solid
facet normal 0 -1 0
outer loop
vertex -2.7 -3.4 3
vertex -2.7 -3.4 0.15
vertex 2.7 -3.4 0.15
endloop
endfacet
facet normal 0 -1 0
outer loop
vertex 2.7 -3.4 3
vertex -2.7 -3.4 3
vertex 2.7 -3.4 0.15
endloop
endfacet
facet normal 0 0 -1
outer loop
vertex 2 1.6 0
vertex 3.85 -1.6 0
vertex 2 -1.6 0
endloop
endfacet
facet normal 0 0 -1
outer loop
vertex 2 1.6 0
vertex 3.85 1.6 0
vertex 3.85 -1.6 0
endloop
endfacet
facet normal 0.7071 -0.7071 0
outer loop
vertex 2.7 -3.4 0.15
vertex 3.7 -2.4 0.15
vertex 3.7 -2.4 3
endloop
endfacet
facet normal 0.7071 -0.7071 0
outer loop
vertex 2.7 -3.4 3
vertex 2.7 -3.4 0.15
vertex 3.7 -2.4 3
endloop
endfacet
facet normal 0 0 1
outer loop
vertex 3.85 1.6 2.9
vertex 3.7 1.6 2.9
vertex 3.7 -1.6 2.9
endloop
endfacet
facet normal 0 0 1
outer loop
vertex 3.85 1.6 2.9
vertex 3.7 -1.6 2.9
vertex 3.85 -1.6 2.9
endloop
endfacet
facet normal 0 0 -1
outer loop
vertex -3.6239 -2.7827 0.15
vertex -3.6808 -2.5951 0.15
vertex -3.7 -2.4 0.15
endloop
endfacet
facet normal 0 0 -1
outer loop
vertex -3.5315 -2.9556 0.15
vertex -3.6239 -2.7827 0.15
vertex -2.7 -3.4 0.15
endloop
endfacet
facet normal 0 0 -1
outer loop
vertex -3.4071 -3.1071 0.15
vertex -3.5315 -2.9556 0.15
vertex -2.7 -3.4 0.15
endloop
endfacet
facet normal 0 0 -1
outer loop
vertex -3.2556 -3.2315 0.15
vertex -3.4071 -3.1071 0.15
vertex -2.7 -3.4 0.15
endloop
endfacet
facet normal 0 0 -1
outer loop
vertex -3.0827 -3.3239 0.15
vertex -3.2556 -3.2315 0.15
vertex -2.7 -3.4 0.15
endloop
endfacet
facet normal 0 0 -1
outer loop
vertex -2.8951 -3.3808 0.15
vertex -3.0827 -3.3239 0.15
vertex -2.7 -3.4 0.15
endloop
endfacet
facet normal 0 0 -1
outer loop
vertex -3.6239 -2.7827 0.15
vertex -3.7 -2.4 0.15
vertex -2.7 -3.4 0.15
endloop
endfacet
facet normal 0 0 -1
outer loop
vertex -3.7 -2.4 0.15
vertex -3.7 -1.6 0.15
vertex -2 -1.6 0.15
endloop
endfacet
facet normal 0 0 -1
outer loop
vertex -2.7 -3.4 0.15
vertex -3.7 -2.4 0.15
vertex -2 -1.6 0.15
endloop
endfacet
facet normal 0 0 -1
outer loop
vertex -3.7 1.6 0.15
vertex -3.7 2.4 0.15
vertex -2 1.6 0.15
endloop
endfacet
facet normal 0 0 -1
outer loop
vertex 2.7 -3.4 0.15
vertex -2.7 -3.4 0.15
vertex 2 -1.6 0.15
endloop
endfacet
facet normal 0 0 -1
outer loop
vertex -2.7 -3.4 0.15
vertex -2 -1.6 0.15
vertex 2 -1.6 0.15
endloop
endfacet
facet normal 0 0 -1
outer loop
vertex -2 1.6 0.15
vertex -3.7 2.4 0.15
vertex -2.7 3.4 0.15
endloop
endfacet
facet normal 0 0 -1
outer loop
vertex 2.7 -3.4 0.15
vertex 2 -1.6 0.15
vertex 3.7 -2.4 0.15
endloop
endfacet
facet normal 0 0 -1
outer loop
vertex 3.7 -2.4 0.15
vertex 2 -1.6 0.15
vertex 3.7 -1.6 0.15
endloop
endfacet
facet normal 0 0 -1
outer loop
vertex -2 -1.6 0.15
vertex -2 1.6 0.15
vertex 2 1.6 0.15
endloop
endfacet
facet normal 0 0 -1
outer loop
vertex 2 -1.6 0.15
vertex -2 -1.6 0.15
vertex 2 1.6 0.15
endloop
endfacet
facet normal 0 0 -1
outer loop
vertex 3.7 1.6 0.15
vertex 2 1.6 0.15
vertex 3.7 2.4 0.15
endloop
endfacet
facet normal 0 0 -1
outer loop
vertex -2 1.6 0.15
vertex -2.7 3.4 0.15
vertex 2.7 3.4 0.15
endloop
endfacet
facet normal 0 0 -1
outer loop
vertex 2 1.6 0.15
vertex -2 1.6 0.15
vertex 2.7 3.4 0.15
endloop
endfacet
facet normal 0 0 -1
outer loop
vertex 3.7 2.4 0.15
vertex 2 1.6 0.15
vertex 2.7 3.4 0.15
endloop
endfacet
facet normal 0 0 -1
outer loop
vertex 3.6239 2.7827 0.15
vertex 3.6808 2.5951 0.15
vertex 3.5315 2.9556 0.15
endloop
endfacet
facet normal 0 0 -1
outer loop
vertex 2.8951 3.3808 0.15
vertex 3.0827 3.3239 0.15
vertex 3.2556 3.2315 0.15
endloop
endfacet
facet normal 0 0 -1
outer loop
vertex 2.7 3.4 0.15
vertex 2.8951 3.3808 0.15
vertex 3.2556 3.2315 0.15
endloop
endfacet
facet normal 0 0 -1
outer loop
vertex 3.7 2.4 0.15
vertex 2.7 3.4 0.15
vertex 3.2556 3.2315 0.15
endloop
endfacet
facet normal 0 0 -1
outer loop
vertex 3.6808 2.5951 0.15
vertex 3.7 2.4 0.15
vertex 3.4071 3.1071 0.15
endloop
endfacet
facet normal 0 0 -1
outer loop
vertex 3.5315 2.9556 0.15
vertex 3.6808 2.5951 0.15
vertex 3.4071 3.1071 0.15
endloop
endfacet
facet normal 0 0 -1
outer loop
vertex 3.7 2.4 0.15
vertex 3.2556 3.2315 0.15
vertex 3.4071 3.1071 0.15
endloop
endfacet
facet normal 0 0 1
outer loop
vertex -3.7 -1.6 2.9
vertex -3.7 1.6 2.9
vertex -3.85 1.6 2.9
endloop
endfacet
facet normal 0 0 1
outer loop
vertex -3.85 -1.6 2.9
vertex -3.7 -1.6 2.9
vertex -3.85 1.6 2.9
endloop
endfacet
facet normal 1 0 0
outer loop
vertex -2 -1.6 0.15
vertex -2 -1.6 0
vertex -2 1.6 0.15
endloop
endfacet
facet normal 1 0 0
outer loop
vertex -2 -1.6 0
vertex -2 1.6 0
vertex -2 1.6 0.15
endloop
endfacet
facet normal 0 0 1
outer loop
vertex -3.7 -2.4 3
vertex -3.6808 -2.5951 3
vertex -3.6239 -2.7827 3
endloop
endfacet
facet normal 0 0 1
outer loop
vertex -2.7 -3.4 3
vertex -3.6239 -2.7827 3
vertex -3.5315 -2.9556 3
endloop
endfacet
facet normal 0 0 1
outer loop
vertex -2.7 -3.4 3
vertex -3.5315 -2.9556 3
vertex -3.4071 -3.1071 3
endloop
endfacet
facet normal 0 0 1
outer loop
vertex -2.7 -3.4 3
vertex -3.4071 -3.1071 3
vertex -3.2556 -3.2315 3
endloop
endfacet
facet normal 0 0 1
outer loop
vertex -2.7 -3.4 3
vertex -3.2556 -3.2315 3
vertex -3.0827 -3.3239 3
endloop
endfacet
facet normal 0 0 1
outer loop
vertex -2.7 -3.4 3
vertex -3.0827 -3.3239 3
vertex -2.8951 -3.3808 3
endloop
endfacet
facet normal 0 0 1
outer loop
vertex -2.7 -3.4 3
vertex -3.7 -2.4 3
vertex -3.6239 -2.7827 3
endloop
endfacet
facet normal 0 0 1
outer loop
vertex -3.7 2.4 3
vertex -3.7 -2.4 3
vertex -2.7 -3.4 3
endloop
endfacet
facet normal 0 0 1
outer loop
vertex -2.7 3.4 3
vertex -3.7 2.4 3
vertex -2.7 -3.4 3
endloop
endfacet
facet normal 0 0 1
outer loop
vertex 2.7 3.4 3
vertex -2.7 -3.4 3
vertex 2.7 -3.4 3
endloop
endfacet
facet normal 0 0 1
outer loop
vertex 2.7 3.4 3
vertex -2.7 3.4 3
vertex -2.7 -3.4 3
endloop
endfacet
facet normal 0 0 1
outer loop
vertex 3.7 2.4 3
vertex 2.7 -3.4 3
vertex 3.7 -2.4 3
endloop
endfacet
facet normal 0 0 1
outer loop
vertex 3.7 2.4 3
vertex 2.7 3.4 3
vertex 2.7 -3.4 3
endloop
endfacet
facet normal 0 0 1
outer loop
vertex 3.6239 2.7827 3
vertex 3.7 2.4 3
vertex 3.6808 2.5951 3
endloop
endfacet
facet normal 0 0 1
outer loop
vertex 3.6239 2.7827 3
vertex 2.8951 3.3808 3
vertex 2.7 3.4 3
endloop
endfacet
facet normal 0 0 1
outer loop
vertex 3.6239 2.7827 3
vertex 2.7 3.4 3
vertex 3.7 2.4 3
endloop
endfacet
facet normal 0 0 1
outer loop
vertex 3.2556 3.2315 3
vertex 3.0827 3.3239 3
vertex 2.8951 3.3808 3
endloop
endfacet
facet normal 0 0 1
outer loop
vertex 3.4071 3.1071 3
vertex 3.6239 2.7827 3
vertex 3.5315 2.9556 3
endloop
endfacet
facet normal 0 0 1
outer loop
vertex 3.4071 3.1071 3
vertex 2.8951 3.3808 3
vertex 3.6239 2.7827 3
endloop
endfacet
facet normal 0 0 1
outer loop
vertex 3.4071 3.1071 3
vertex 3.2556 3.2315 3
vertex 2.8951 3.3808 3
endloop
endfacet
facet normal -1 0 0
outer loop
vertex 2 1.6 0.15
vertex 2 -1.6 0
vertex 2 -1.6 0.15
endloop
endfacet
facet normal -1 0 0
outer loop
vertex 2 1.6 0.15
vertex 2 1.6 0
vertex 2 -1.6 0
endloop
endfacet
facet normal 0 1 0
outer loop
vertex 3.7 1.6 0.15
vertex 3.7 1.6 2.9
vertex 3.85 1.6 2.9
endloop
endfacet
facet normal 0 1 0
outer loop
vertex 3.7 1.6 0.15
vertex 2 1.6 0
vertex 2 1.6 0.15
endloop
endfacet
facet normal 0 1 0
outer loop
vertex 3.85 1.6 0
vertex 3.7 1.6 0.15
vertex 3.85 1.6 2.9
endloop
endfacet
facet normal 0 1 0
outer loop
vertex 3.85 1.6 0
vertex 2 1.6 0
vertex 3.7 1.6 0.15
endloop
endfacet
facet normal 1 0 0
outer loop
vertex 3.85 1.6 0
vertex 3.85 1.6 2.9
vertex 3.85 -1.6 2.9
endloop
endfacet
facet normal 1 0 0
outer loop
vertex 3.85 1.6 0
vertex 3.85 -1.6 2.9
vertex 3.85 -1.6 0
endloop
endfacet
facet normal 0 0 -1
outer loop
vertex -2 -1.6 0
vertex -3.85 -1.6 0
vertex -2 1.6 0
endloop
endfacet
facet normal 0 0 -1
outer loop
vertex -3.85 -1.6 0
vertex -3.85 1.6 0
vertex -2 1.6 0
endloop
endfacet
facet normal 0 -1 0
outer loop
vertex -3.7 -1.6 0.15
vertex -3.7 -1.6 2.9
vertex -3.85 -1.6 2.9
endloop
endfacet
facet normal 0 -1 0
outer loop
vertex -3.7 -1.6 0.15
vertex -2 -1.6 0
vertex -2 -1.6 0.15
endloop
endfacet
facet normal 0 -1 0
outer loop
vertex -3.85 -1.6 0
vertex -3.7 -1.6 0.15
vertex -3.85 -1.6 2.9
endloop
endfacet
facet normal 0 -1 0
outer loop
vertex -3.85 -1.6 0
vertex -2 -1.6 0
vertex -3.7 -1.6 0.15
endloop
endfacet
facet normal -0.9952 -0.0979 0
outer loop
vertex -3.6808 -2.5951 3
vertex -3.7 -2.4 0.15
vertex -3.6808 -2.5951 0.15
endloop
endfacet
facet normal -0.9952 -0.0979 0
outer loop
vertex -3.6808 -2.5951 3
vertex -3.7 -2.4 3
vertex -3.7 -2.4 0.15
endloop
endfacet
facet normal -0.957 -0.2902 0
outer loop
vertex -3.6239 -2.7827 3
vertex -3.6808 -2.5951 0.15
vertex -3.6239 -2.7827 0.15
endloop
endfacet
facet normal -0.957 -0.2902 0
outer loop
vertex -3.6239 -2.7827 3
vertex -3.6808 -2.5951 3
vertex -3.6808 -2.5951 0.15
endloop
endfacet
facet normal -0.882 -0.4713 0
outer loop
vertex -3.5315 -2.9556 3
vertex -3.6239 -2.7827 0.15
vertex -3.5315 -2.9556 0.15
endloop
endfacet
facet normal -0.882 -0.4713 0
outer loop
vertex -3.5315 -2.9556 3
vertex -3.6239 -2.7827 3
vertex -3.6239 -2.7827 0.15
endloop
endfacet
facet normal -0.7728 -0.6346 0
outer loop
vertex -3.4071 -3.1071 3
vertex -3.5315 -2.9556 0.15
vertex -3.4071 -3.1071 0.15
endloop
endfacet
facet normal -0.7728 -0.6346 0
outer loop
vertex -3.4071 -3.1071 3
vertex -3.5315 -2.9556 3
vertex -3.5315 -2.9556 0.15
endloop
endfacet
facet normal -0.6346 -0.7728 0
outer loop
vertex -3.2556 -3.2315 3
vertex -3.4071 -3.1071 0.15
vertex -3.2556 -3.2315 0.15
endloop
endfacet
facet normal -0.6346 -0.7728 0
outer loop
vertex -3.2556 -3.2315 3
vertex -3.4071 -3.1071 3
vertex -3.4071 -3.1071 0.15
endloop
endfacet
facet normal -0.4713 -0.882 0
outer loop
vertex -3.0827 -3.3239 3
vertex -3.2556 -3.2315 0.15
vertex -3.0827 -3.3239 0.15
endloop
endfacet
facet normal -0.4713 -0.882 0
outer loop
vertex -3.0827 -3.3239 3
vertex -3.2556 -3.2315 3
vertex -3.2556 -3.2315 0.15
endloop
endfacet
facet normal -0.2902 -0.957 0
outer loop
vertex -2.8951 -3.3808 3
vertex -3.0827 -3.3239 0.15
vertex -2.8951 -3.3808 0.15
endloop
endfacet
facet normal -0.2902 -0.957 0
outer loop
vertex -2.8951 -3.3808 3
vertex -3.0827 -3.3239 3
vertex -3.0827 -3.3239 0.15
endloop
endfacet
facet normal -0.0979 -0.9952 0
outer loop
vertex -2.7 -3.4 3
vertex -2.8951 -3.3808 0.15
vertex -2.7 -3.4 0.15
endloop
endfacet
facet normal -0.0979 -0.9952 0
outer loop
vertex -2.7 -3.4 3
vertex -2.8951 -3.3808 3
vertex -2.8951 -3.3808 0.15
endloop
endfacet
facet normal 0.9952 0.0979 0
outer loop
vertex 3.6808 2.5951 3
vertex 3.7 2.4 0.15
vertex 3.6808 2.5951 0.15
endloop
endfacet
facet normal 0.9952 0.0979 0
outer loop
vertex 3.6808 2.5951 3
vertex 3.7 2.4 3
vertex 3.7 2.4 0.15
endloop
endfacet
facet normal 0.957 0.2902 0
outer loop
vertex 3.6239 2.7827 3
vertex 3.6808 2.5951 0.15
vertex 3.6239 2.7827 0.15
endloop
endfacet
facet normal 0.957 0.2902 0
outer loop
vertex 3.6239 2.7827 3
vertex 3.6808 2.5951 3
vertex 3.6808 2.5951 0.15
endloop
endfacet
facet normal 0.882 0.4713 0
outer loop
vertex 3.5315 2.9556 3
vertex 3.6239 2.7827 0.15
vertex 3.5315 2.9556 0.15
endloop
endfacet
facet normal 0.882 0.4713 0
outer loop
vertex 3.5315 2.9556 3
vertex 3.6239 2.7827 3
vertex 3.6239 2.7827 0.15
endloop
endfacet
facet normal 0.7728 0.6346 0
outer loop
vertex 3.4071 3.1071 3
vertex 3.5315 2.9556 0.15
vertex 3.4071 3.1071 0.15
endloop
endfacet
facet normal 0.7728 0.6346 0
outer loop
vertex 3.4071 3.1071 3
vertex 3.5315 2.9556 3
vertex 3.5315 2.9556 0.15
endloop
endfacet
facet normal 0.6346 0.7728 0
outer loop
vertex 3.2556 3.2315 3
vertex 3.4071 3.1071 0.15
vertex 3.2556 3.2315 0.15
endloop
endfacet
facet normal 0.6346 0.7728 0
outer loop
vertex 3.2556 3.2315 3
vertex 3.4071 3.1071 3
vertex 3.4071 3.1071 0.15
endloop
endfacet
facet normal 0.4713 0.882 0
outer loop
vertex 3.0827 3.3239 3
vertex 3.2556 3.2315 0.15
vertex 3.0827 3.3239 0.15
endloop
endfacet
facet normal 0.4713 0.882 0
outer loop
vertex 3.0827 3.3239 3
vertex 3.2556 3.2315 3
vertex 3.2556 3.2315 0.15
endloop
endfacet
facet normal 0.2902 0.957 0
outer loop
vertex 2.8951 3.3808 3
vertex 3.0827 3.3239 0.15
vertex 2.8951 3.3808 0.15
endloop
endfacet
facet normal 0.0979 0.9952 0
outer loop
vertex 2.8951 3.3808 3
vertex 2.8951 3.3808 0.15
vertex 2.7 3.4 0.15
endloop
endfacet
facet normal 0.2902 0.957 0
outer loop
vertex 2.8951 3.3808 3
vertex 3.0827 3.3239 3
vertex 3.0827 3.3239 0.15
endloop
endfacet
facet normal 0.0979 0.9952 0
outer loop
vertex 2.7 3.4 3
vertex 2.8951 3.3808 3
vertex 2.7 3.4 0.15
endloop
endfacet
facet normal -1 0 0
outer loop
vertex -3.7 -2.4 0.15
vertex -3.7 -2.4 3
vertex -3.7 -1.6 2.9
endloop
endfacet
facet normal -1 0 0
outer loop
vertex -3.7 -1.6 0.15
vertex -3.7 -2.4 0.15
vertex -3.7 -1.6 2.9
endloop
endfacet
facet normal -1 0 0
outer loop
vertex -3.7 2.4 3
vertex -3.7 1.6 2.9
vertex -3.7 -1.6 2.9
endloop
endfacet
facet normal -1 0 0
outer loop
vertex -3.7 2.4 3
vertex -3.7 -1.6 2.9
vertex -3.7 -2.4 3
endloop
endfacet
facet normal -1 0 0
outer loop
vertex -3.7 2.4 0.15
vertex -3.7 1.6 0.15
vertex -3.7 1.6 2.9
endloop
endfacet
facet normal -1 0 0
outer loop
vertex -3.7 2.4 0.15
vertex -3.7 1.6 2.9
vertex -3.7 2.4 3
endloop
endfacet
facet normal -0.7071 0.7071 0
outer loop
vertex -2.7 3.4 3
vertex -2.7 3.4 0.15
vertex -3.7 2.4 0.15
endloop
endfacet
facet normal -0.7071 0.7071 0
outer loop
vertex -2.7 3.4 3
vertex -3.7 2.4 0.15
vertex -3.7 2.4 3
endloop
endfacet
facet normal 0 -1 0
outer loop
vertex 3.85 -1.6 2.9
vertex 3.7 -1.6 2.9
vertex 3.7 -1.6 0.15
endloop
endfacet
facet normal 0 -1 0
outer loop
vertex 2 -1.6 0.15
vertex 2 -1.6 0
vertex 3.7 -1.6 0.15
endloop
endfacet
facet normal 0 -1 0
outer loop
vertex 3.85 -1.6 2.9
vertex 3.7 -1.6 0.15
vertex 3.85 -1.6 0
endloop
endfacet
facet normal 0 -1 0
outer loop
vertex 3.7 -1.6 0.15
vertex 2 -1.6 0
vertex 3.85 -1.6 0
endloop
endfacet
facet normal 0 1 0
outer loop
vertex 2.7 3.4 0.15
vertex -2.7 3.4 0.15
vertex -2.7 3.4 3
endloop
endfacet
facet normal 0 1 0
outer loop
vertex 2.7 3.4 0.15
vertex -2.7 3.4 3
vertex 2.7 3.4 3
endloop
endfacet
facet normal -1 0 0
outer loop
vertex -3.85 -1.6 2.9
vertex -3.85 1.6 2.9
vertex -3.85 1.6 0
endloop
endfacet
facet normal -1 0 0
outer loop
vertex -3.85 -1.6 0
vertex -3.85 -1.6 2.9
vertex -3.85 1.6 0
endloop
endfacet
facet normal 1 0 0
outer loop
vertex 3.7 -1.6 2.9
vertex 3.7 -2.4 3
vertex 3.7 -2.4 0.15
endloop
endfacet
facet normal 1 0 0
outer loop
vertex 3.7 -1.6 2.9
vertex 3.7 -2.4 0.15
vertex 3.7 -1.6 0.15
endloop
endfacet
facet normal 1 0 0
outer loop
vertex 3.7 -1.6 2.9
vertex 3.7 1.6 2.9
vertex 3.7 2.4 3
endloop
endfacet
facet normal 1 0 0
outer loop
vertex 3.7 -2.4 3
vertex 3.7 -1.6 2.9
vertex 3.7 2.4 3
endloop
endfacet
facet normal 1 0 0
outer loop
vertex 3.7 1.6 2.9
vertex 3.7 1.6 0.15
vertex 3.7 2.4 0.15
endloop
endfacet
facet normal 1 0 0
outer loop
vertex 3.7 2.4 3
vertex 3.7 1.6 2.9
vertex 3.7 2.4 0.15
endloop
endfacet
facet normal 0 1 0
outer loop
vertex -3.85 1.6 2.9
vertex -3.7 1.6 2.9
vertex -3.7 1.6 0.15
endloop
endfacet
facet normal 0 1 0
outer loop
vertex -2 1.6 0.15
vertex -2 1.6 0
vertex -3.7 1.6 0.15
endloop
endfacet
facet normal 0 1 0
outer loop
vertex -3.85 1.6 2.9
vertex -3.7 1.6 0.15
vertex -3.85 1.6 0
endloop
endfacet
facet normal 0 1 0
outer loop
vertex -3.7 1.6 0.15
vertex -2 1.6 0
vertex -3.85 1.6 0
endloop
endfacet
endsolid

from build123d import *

# Parameters (mm, degrees)
BOSS_EXTRUDE1_START = 0.15
SKETCH1_W           = 7.4
SKETCH1_H           = 6.8
BOSS_EXTRUDE1_DEPTH = 2.85
FILLET1_R           = 1
CHAMFER1_SIZE       = 1
BOSS_EXTRUDE2_DEPTH = 1.6


with BuildPart() as part:
    # Sketch1 → Boss-Extrude1 (new body)
    with BuildSketch(Plane.XY.offset(BOSS_EXTRUDE1_START)):
        Rectangle(SKETCH1_W, SKETCH1_H)
    extrude(amount=BOSS_EXTRUDE1_DEPTH)

    # Fillet1
    fillet1_edges = [part.edges().sort_by_distance(p)[0] for p in [
        (-3.7, -3.4, 1.575),
        (3.7, 3.4, 1.575),
    ]]
    fillet(fillet1_edges, radius=FILLET1_R)

    # Chamfer1
    chamfer1_edges = [part.edges().sort_by_distance(p)[0] for p in [
        (3.7, -3.4, 1.575),
        (-3.7, 3.4, 1.575),
    ]]
    chamfer(chamfer1_edges, length=CHAMFER1_SIZE)

    # Sketch2 → Boss-Extrude2 (add, symmetric)
    with BuildSketch(Plane(origin=(0, 0, 0), x_dir=(1, 0, 0), z_dir=(0, 1, 0))):
        Polygon((2, -0.15), (3.7, -0.15), (3.7, -2.9), (3.85, -2.9), (3.85, 0), (2, 0), align=None)
    boss_extrude2 = extrude(amount=BOSS_EXTRUDE2_DEPTH, both=True)

    # Mirror1: Boss-Extrude2 across plane
    add(boss_extrude2.mirror(Plane(origin=(0, 0, 0), x_dir=(0, 0, 1), z_dir=(1, 0, 0))))


solid = part.part
